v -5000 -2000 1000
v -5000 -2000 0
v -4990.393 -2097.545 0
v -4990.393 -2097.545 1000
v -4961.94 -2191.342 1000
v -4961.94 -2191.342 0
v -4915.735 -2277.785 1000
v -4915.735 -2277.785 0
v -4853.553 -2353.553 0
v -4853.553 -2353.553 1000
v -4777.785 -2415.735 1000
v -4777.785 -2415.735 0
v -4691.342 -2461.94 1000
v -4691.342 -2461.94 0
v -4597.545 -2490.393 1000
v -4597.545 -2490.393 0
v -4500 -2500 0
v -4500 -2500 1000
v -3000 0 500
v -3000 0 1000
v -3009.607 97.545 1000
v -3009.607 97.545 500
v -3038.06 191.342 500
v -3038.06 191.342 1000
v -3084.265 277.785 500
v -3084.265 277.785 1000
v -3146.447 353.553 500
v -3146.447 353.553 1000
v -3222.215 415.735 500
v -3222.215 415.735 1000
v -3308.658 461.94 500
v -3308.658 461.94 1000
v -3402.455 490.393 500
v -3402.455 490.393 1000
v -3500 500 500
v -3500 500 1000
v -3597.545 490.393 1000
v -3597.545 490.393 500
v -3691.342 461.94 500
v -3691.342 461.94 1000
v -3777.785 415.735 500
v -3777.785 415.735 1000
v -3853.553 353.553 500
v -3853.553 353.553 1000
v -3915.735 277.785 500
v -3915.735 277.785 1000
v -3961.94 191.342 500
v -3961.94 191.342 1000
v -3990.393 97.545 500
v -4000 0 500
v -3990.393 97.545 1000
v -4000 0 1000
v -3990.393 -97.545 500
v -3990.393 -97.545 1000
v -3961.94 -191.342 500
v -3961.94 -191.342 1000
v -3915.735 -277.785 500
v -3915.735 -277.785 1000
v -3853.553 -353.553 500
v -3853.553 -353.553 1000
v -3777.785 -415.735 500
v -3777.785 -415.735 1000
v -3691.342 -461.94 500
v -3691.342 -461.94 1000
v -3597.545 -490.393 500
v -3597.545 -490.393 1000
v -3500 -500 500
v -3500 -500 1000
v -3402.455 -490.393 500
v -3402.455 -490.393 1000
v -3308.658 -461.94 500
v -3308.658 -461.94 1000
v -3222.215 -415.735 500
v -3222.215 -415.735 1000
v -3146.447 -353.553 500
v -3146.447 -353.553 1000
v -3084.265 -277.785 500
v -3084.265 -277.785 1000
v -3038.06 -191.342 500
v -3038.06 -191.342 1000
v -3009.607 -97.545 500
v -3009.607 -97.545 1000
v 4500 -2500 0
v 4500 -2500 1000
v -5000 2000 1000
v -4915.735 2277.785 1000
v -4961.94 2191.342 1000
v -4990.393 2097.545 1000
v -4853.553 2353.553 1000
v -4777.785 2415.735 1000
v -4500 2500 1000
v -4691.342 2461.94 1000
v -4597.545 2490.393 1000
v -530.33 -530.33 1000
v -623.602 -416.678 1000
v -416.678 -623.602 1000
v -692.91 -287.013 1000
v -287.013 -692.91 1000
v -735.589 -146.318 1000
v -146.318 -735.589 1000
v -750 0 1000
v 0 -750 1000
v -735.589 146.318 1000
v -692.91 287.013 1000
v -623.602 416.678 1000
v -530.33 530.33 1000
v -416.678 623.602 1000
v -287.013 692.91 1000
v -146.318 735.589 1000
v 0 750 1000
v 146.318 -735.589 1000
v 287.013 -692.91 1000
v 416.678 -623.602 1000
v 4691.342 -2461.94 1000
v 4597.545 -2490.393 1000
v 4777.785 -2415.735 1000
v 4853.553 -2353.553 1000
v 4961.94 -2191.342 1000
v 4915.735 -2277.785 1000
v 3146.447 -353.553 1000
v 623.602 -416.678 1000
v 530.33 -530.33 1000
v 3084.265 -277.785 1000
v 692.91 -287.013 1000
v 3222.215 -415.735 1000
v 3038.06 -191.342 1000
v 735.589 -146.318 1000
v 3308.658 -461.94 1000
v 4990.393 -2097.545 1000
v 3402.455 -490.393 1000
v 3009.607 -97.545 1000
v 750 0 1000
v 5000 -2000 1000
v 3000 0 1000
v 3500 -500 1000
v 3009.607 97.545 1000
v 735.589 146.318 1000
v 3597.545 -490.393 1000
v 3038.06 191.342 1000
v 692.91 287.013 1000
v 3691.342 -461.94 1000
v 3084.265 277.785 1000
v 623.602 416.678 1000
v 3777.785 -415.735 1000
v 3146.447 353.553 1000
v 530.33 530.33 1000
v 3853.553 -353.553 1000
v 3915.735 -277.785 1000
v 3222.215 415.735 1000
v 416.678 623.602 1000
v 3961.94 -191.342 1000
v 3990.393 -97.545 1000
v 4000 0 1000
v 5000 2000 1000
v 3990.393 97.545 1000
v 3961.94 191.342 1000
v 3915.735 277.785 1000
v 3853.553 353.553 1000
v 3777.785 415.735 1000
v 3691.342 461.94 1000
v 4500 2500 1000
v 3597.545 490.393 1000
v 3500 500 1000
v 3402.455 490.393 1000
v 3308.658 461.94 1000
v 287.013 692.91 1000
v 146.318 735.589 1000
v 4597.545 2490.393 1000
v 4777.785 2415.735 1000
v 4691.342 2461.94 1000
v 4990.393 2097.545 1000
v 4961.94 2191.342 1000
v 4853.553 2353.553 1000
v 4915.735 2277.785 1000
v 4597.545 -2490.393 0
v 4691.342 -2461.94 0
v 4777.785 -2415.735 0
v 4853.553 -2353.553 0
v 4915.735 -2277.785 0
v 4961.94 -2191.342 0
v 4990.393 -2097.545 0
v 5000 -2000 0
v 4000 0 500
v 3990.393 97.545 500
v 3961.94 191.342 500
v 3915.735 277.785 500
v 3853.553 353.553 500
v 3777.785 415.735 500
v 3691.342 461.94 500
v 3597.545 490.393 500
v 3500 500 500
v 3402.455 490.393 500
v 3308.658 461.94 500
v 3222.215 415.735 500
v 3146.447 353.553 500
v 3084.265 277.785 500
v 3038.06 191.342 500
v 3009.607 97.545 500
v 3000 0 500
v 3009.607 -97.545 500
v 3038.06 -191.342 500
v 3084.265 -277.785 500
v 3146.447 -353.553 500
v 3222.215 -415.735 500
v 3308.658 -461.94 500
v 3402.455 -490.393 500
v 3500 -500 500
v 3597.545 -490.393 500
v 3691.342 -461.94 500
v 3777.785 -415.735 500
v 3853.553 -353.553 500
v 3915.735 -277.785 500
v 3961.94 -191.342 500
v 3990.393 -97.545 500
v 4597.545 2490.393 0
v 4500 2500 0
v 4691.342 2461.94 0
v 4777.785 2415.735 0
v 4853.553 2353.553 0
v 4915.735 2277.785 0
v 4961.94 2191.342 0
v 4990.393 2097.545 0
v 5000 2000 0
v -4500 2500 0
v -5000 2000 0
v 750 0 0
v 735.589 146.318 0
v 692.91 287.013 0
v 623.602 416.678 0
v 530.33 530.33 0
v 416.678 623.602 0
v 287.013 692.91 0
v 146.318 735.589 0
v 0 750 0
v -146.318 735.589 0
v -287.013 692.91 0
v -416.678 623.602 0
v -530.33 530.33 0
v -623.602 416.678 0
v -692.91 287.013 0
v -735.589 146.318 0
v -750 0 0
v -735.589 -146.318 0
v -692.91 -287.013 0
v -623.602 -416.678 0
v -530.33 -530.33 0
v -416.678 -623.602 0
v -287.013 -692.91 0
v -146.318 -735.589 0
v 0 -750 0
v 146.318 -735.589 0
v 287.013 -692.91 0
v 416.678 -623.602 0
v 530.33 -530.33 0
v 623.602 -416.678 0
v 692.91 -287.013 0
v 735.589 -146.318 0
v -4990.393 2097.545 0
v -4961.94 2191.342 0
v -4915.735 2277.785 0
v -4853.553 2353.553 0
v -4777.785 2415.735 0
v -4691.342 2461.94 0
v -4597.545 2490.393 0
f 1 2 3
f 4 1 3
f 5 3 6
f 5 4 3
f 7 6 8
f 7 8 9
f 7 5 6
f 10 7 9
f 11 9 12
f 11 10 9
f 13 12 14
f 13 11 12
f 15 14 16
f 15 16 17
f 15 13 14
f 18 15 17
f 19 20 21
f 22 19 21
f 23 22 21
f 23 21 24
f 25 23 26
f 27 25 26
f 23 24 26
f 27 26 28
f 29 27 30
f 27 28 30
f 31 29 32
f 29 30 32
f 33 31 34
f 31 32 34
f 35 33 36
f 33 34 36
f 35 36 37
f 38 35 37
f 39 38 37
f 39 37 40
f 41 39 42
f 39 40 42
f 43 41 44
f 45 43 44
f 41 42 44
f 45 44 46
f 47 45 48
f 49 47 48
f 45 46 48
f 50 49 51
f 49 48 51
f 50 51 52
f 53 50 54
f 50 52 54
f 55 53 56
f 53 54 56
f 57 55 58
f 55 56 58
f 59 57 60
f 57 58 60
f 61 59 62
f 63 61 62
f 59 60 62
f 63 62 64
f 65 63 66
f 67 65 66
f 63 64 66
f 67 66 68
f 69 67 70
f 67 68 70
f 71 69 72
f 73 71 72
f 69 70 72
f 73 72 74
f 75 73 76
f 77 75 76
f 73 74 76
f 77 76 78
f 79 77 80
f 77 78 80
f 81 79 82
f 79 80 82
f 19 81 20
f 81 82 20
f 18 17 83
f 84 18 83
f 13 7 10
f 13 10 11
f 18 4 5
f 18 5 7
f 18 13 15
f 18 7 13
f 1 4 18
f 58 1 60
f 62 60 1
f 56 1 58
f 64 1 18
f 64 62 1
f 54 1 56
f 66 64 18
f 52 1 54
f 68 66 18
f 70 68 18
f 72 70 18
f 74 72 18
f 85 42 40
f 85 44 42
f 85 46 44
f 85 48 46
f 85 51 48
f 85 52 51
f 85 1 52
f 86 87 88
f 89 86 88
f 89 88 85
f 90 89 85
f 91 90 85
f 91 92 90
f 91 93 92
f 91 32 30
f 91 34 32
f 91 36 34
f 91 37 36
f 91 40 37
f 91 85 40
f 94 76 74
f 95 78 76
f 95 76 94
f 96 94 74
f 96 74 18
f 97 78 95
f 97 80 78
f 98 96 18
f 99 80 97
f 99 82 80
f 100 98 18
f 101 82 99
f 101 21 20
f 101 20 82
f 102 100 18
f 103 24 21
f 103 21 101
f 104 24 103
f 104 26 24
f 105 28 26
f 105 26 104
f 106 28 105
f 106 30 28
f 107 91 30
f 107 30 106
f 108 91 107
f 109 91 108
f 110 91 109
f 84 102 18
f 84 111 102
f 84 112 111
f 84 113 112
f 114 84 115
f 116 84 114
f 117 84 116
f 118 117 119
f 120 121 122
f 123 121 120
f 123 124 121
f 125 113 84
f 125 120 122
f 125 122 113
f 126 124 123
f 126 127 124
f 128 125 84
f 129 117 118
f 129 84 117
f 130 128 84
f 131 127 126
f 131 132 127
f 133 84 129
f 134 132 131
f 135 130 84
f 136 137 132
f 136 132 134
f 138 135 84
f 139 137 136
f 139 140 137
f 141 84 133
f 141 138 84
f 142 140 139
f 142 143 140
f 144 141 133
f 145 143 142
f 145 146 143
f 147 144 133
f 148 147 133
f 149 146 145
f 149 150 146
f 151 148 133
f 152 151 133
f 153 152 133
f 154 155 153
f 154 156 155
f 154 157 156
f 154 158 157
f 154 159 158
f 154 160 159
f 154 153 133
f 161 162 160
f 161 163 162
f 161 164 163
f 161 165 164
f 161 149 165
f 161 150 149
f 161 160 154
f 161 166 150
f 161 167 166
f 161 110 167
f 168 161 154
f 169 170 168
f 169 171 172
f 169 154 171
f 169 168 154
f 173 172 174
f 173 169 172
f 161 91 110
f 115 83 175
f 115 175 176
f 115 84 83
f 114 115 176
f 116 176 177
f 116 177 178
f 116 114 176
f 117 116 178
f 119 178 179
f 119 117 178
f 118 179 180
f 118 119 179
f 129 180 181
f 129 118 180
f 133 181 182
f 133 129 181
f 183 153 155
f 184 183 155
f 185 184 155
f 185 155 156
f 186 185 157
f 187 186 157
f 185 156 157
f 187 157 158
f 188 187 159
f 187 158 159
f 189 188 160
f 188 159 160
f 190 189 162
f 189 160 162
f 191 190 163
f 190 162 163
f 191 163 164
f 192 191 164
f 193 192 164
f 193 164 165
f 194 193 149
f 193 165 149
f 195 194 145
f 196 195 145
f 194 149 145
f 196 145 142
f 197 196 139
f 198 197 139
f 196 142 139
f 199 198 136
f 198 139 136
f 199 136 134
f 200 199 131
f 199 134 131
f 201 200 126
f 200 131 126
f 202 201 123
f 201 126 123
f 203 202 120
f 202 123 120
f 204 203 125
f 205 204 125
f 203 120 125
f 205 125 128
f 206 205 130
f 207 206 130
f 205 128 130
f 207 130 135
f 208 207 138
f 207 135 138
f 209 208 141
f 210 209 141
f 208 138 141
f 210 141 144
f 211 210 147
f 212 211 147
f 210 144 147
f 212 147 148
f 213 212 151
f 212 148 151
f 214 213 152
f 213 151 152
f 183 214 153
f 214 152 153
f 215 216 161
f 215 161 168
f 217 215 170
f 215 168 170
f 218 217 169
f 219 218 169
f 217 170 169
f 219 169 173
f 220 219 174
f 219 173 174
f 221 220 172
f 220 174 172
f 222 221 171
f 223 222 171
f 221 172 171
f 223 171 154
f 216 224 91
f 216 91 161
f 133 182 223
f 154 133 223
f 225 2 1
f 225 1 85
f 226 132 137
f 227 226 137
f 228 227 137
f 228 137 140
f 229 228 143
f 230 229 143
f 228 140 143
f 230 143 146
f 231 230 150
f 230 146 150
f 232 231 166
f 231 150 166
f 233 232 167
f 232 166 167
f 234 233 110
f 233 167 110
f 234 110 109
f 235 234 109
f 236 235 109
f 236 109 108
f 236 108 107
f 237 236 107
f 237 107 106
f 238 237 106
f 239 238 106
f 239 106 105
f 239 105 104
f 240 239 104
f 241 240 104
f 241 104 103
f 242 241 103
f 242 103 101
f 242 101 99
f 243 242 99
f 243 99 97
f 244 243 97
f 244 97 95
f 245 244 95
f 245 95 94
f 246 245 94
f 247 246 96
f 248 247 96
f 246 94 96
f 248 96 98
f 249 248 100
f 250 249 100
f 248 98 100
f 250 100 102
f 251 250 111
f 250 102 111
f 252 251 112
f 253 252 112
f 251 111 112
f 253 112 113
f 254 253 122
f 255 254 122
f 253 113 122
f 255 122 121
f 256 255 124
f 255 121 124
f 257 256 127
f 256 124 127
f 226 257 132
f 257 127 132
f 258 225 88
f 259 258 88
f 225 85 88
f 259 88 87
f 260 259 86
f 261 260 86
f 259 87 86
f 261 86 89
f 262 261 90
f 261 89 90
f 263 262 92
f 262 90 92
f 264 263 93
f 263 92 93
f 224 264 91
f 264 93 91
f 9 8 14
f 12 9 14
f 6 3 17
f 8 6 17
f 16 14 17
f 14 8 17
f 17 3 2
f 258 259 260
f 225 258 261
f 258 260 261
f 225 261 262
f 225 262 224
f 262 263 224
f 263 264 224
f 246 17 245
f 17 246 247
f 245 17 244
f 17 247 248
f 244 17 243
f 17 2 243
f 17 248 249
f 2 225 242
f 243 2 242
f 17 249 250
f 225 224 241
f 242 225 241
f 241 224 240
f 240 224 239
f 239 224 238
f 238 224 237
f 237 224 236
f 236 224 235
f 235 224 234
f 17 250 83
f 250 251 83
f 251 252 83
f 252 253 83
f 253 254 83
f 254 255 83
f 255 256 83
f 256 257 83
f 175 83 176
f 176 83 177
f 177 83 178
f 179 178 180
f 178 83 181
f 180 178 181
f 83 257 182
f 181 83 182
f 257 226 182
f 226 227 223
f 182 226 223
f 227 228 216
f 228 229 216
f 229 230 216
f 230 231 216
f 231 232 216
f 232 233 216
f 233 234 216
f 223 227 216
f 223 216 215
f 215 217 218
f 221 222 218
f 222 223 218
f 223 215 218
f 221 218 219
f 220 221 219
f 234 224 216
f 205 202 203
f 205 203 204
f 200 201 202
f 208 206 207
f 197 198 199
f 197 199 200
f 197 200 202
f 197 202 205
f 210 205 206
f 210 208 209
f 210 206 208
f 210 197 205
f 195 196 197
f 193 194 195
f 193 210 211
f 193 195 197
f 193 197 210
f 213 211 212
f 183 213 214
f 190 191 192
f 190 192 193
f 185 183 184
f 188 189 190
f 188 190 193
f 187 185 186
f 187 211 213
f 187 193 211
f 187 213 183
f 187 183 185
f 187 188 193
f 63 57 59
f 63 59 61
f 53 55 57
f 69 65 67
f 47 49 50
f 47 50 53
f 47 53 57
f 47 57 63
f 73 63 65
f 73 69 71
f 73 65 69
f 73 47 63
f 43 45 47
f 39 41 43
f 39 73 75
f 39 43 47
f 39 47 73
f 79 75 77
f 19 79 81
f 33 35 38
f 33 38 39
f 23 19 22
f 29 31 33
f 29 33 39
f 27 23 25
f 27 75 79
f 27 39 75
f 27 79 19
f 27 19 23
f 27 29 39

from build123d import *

# Parameters (mm, degrees)
SKETCH1_W           = 10000
SKETCH1_H           = 5000
BOSS_EXTRUDE1_DEPTH = 1000
FILLET1_R           = 500
FILLET2_R           = 500
SKETCH2_R           = 500
CUT_EXTRUDE1_DEPTH  = 500
SKETCH3_R           = 750
CUT_EXTRUDE2_DEPTH  = 5679.9083458


with BuildPart() as part:
    # Sketch1 → Boss-Extrude1 (new body)
    with BuildSketch(Plane.XY):
        Rectangle(SKETCH1_W, SKETCH1_H)
    extrude(amount=BOSS_EXTRUDE1_DEPTH)

    # Fillet1
    fillet1_edges = [part.edges().sort_by_distance(p)[0] for p in [
        (-5000, 2500, 500),
    ]]
    fillet(fillet1_edges, radius=FILLET1_R)

    # Fillet2
    fillet2_edges = [part.edges().sort_by_distance(p)[0] for p in [
        (5000, -2500, 500),
        (-5000, -2500, 500),
        (5000, 2500, 500),
    ]]
    fillet(fillet2_edges, radius=FILLET2_R)

    # Sketch2 → Cut-Extrude1 (cut)
    with BuildSketch(Plane.XY.offset(1000)):
        with Locations((-3500, 0)):
            Circle(SKETCH2_R)
        with Locations((3500, 0)):
            Circle(SKETCH2_R)
    extrude(amount=-CUT_EXTRUDE1_DEPTH, mode=Mode.SUBTRACT)

    # Sketch3 → Cut-Extrude2 (cut, through all)
    with BuildSketch(Plane.XY.offset(1000)):
        Circle(SKETCH3_R)
    extrude(amount=-CUT_EXTRUDE2_DEPTH, mode=Mode.SUBTRACT)


solid = part.part
